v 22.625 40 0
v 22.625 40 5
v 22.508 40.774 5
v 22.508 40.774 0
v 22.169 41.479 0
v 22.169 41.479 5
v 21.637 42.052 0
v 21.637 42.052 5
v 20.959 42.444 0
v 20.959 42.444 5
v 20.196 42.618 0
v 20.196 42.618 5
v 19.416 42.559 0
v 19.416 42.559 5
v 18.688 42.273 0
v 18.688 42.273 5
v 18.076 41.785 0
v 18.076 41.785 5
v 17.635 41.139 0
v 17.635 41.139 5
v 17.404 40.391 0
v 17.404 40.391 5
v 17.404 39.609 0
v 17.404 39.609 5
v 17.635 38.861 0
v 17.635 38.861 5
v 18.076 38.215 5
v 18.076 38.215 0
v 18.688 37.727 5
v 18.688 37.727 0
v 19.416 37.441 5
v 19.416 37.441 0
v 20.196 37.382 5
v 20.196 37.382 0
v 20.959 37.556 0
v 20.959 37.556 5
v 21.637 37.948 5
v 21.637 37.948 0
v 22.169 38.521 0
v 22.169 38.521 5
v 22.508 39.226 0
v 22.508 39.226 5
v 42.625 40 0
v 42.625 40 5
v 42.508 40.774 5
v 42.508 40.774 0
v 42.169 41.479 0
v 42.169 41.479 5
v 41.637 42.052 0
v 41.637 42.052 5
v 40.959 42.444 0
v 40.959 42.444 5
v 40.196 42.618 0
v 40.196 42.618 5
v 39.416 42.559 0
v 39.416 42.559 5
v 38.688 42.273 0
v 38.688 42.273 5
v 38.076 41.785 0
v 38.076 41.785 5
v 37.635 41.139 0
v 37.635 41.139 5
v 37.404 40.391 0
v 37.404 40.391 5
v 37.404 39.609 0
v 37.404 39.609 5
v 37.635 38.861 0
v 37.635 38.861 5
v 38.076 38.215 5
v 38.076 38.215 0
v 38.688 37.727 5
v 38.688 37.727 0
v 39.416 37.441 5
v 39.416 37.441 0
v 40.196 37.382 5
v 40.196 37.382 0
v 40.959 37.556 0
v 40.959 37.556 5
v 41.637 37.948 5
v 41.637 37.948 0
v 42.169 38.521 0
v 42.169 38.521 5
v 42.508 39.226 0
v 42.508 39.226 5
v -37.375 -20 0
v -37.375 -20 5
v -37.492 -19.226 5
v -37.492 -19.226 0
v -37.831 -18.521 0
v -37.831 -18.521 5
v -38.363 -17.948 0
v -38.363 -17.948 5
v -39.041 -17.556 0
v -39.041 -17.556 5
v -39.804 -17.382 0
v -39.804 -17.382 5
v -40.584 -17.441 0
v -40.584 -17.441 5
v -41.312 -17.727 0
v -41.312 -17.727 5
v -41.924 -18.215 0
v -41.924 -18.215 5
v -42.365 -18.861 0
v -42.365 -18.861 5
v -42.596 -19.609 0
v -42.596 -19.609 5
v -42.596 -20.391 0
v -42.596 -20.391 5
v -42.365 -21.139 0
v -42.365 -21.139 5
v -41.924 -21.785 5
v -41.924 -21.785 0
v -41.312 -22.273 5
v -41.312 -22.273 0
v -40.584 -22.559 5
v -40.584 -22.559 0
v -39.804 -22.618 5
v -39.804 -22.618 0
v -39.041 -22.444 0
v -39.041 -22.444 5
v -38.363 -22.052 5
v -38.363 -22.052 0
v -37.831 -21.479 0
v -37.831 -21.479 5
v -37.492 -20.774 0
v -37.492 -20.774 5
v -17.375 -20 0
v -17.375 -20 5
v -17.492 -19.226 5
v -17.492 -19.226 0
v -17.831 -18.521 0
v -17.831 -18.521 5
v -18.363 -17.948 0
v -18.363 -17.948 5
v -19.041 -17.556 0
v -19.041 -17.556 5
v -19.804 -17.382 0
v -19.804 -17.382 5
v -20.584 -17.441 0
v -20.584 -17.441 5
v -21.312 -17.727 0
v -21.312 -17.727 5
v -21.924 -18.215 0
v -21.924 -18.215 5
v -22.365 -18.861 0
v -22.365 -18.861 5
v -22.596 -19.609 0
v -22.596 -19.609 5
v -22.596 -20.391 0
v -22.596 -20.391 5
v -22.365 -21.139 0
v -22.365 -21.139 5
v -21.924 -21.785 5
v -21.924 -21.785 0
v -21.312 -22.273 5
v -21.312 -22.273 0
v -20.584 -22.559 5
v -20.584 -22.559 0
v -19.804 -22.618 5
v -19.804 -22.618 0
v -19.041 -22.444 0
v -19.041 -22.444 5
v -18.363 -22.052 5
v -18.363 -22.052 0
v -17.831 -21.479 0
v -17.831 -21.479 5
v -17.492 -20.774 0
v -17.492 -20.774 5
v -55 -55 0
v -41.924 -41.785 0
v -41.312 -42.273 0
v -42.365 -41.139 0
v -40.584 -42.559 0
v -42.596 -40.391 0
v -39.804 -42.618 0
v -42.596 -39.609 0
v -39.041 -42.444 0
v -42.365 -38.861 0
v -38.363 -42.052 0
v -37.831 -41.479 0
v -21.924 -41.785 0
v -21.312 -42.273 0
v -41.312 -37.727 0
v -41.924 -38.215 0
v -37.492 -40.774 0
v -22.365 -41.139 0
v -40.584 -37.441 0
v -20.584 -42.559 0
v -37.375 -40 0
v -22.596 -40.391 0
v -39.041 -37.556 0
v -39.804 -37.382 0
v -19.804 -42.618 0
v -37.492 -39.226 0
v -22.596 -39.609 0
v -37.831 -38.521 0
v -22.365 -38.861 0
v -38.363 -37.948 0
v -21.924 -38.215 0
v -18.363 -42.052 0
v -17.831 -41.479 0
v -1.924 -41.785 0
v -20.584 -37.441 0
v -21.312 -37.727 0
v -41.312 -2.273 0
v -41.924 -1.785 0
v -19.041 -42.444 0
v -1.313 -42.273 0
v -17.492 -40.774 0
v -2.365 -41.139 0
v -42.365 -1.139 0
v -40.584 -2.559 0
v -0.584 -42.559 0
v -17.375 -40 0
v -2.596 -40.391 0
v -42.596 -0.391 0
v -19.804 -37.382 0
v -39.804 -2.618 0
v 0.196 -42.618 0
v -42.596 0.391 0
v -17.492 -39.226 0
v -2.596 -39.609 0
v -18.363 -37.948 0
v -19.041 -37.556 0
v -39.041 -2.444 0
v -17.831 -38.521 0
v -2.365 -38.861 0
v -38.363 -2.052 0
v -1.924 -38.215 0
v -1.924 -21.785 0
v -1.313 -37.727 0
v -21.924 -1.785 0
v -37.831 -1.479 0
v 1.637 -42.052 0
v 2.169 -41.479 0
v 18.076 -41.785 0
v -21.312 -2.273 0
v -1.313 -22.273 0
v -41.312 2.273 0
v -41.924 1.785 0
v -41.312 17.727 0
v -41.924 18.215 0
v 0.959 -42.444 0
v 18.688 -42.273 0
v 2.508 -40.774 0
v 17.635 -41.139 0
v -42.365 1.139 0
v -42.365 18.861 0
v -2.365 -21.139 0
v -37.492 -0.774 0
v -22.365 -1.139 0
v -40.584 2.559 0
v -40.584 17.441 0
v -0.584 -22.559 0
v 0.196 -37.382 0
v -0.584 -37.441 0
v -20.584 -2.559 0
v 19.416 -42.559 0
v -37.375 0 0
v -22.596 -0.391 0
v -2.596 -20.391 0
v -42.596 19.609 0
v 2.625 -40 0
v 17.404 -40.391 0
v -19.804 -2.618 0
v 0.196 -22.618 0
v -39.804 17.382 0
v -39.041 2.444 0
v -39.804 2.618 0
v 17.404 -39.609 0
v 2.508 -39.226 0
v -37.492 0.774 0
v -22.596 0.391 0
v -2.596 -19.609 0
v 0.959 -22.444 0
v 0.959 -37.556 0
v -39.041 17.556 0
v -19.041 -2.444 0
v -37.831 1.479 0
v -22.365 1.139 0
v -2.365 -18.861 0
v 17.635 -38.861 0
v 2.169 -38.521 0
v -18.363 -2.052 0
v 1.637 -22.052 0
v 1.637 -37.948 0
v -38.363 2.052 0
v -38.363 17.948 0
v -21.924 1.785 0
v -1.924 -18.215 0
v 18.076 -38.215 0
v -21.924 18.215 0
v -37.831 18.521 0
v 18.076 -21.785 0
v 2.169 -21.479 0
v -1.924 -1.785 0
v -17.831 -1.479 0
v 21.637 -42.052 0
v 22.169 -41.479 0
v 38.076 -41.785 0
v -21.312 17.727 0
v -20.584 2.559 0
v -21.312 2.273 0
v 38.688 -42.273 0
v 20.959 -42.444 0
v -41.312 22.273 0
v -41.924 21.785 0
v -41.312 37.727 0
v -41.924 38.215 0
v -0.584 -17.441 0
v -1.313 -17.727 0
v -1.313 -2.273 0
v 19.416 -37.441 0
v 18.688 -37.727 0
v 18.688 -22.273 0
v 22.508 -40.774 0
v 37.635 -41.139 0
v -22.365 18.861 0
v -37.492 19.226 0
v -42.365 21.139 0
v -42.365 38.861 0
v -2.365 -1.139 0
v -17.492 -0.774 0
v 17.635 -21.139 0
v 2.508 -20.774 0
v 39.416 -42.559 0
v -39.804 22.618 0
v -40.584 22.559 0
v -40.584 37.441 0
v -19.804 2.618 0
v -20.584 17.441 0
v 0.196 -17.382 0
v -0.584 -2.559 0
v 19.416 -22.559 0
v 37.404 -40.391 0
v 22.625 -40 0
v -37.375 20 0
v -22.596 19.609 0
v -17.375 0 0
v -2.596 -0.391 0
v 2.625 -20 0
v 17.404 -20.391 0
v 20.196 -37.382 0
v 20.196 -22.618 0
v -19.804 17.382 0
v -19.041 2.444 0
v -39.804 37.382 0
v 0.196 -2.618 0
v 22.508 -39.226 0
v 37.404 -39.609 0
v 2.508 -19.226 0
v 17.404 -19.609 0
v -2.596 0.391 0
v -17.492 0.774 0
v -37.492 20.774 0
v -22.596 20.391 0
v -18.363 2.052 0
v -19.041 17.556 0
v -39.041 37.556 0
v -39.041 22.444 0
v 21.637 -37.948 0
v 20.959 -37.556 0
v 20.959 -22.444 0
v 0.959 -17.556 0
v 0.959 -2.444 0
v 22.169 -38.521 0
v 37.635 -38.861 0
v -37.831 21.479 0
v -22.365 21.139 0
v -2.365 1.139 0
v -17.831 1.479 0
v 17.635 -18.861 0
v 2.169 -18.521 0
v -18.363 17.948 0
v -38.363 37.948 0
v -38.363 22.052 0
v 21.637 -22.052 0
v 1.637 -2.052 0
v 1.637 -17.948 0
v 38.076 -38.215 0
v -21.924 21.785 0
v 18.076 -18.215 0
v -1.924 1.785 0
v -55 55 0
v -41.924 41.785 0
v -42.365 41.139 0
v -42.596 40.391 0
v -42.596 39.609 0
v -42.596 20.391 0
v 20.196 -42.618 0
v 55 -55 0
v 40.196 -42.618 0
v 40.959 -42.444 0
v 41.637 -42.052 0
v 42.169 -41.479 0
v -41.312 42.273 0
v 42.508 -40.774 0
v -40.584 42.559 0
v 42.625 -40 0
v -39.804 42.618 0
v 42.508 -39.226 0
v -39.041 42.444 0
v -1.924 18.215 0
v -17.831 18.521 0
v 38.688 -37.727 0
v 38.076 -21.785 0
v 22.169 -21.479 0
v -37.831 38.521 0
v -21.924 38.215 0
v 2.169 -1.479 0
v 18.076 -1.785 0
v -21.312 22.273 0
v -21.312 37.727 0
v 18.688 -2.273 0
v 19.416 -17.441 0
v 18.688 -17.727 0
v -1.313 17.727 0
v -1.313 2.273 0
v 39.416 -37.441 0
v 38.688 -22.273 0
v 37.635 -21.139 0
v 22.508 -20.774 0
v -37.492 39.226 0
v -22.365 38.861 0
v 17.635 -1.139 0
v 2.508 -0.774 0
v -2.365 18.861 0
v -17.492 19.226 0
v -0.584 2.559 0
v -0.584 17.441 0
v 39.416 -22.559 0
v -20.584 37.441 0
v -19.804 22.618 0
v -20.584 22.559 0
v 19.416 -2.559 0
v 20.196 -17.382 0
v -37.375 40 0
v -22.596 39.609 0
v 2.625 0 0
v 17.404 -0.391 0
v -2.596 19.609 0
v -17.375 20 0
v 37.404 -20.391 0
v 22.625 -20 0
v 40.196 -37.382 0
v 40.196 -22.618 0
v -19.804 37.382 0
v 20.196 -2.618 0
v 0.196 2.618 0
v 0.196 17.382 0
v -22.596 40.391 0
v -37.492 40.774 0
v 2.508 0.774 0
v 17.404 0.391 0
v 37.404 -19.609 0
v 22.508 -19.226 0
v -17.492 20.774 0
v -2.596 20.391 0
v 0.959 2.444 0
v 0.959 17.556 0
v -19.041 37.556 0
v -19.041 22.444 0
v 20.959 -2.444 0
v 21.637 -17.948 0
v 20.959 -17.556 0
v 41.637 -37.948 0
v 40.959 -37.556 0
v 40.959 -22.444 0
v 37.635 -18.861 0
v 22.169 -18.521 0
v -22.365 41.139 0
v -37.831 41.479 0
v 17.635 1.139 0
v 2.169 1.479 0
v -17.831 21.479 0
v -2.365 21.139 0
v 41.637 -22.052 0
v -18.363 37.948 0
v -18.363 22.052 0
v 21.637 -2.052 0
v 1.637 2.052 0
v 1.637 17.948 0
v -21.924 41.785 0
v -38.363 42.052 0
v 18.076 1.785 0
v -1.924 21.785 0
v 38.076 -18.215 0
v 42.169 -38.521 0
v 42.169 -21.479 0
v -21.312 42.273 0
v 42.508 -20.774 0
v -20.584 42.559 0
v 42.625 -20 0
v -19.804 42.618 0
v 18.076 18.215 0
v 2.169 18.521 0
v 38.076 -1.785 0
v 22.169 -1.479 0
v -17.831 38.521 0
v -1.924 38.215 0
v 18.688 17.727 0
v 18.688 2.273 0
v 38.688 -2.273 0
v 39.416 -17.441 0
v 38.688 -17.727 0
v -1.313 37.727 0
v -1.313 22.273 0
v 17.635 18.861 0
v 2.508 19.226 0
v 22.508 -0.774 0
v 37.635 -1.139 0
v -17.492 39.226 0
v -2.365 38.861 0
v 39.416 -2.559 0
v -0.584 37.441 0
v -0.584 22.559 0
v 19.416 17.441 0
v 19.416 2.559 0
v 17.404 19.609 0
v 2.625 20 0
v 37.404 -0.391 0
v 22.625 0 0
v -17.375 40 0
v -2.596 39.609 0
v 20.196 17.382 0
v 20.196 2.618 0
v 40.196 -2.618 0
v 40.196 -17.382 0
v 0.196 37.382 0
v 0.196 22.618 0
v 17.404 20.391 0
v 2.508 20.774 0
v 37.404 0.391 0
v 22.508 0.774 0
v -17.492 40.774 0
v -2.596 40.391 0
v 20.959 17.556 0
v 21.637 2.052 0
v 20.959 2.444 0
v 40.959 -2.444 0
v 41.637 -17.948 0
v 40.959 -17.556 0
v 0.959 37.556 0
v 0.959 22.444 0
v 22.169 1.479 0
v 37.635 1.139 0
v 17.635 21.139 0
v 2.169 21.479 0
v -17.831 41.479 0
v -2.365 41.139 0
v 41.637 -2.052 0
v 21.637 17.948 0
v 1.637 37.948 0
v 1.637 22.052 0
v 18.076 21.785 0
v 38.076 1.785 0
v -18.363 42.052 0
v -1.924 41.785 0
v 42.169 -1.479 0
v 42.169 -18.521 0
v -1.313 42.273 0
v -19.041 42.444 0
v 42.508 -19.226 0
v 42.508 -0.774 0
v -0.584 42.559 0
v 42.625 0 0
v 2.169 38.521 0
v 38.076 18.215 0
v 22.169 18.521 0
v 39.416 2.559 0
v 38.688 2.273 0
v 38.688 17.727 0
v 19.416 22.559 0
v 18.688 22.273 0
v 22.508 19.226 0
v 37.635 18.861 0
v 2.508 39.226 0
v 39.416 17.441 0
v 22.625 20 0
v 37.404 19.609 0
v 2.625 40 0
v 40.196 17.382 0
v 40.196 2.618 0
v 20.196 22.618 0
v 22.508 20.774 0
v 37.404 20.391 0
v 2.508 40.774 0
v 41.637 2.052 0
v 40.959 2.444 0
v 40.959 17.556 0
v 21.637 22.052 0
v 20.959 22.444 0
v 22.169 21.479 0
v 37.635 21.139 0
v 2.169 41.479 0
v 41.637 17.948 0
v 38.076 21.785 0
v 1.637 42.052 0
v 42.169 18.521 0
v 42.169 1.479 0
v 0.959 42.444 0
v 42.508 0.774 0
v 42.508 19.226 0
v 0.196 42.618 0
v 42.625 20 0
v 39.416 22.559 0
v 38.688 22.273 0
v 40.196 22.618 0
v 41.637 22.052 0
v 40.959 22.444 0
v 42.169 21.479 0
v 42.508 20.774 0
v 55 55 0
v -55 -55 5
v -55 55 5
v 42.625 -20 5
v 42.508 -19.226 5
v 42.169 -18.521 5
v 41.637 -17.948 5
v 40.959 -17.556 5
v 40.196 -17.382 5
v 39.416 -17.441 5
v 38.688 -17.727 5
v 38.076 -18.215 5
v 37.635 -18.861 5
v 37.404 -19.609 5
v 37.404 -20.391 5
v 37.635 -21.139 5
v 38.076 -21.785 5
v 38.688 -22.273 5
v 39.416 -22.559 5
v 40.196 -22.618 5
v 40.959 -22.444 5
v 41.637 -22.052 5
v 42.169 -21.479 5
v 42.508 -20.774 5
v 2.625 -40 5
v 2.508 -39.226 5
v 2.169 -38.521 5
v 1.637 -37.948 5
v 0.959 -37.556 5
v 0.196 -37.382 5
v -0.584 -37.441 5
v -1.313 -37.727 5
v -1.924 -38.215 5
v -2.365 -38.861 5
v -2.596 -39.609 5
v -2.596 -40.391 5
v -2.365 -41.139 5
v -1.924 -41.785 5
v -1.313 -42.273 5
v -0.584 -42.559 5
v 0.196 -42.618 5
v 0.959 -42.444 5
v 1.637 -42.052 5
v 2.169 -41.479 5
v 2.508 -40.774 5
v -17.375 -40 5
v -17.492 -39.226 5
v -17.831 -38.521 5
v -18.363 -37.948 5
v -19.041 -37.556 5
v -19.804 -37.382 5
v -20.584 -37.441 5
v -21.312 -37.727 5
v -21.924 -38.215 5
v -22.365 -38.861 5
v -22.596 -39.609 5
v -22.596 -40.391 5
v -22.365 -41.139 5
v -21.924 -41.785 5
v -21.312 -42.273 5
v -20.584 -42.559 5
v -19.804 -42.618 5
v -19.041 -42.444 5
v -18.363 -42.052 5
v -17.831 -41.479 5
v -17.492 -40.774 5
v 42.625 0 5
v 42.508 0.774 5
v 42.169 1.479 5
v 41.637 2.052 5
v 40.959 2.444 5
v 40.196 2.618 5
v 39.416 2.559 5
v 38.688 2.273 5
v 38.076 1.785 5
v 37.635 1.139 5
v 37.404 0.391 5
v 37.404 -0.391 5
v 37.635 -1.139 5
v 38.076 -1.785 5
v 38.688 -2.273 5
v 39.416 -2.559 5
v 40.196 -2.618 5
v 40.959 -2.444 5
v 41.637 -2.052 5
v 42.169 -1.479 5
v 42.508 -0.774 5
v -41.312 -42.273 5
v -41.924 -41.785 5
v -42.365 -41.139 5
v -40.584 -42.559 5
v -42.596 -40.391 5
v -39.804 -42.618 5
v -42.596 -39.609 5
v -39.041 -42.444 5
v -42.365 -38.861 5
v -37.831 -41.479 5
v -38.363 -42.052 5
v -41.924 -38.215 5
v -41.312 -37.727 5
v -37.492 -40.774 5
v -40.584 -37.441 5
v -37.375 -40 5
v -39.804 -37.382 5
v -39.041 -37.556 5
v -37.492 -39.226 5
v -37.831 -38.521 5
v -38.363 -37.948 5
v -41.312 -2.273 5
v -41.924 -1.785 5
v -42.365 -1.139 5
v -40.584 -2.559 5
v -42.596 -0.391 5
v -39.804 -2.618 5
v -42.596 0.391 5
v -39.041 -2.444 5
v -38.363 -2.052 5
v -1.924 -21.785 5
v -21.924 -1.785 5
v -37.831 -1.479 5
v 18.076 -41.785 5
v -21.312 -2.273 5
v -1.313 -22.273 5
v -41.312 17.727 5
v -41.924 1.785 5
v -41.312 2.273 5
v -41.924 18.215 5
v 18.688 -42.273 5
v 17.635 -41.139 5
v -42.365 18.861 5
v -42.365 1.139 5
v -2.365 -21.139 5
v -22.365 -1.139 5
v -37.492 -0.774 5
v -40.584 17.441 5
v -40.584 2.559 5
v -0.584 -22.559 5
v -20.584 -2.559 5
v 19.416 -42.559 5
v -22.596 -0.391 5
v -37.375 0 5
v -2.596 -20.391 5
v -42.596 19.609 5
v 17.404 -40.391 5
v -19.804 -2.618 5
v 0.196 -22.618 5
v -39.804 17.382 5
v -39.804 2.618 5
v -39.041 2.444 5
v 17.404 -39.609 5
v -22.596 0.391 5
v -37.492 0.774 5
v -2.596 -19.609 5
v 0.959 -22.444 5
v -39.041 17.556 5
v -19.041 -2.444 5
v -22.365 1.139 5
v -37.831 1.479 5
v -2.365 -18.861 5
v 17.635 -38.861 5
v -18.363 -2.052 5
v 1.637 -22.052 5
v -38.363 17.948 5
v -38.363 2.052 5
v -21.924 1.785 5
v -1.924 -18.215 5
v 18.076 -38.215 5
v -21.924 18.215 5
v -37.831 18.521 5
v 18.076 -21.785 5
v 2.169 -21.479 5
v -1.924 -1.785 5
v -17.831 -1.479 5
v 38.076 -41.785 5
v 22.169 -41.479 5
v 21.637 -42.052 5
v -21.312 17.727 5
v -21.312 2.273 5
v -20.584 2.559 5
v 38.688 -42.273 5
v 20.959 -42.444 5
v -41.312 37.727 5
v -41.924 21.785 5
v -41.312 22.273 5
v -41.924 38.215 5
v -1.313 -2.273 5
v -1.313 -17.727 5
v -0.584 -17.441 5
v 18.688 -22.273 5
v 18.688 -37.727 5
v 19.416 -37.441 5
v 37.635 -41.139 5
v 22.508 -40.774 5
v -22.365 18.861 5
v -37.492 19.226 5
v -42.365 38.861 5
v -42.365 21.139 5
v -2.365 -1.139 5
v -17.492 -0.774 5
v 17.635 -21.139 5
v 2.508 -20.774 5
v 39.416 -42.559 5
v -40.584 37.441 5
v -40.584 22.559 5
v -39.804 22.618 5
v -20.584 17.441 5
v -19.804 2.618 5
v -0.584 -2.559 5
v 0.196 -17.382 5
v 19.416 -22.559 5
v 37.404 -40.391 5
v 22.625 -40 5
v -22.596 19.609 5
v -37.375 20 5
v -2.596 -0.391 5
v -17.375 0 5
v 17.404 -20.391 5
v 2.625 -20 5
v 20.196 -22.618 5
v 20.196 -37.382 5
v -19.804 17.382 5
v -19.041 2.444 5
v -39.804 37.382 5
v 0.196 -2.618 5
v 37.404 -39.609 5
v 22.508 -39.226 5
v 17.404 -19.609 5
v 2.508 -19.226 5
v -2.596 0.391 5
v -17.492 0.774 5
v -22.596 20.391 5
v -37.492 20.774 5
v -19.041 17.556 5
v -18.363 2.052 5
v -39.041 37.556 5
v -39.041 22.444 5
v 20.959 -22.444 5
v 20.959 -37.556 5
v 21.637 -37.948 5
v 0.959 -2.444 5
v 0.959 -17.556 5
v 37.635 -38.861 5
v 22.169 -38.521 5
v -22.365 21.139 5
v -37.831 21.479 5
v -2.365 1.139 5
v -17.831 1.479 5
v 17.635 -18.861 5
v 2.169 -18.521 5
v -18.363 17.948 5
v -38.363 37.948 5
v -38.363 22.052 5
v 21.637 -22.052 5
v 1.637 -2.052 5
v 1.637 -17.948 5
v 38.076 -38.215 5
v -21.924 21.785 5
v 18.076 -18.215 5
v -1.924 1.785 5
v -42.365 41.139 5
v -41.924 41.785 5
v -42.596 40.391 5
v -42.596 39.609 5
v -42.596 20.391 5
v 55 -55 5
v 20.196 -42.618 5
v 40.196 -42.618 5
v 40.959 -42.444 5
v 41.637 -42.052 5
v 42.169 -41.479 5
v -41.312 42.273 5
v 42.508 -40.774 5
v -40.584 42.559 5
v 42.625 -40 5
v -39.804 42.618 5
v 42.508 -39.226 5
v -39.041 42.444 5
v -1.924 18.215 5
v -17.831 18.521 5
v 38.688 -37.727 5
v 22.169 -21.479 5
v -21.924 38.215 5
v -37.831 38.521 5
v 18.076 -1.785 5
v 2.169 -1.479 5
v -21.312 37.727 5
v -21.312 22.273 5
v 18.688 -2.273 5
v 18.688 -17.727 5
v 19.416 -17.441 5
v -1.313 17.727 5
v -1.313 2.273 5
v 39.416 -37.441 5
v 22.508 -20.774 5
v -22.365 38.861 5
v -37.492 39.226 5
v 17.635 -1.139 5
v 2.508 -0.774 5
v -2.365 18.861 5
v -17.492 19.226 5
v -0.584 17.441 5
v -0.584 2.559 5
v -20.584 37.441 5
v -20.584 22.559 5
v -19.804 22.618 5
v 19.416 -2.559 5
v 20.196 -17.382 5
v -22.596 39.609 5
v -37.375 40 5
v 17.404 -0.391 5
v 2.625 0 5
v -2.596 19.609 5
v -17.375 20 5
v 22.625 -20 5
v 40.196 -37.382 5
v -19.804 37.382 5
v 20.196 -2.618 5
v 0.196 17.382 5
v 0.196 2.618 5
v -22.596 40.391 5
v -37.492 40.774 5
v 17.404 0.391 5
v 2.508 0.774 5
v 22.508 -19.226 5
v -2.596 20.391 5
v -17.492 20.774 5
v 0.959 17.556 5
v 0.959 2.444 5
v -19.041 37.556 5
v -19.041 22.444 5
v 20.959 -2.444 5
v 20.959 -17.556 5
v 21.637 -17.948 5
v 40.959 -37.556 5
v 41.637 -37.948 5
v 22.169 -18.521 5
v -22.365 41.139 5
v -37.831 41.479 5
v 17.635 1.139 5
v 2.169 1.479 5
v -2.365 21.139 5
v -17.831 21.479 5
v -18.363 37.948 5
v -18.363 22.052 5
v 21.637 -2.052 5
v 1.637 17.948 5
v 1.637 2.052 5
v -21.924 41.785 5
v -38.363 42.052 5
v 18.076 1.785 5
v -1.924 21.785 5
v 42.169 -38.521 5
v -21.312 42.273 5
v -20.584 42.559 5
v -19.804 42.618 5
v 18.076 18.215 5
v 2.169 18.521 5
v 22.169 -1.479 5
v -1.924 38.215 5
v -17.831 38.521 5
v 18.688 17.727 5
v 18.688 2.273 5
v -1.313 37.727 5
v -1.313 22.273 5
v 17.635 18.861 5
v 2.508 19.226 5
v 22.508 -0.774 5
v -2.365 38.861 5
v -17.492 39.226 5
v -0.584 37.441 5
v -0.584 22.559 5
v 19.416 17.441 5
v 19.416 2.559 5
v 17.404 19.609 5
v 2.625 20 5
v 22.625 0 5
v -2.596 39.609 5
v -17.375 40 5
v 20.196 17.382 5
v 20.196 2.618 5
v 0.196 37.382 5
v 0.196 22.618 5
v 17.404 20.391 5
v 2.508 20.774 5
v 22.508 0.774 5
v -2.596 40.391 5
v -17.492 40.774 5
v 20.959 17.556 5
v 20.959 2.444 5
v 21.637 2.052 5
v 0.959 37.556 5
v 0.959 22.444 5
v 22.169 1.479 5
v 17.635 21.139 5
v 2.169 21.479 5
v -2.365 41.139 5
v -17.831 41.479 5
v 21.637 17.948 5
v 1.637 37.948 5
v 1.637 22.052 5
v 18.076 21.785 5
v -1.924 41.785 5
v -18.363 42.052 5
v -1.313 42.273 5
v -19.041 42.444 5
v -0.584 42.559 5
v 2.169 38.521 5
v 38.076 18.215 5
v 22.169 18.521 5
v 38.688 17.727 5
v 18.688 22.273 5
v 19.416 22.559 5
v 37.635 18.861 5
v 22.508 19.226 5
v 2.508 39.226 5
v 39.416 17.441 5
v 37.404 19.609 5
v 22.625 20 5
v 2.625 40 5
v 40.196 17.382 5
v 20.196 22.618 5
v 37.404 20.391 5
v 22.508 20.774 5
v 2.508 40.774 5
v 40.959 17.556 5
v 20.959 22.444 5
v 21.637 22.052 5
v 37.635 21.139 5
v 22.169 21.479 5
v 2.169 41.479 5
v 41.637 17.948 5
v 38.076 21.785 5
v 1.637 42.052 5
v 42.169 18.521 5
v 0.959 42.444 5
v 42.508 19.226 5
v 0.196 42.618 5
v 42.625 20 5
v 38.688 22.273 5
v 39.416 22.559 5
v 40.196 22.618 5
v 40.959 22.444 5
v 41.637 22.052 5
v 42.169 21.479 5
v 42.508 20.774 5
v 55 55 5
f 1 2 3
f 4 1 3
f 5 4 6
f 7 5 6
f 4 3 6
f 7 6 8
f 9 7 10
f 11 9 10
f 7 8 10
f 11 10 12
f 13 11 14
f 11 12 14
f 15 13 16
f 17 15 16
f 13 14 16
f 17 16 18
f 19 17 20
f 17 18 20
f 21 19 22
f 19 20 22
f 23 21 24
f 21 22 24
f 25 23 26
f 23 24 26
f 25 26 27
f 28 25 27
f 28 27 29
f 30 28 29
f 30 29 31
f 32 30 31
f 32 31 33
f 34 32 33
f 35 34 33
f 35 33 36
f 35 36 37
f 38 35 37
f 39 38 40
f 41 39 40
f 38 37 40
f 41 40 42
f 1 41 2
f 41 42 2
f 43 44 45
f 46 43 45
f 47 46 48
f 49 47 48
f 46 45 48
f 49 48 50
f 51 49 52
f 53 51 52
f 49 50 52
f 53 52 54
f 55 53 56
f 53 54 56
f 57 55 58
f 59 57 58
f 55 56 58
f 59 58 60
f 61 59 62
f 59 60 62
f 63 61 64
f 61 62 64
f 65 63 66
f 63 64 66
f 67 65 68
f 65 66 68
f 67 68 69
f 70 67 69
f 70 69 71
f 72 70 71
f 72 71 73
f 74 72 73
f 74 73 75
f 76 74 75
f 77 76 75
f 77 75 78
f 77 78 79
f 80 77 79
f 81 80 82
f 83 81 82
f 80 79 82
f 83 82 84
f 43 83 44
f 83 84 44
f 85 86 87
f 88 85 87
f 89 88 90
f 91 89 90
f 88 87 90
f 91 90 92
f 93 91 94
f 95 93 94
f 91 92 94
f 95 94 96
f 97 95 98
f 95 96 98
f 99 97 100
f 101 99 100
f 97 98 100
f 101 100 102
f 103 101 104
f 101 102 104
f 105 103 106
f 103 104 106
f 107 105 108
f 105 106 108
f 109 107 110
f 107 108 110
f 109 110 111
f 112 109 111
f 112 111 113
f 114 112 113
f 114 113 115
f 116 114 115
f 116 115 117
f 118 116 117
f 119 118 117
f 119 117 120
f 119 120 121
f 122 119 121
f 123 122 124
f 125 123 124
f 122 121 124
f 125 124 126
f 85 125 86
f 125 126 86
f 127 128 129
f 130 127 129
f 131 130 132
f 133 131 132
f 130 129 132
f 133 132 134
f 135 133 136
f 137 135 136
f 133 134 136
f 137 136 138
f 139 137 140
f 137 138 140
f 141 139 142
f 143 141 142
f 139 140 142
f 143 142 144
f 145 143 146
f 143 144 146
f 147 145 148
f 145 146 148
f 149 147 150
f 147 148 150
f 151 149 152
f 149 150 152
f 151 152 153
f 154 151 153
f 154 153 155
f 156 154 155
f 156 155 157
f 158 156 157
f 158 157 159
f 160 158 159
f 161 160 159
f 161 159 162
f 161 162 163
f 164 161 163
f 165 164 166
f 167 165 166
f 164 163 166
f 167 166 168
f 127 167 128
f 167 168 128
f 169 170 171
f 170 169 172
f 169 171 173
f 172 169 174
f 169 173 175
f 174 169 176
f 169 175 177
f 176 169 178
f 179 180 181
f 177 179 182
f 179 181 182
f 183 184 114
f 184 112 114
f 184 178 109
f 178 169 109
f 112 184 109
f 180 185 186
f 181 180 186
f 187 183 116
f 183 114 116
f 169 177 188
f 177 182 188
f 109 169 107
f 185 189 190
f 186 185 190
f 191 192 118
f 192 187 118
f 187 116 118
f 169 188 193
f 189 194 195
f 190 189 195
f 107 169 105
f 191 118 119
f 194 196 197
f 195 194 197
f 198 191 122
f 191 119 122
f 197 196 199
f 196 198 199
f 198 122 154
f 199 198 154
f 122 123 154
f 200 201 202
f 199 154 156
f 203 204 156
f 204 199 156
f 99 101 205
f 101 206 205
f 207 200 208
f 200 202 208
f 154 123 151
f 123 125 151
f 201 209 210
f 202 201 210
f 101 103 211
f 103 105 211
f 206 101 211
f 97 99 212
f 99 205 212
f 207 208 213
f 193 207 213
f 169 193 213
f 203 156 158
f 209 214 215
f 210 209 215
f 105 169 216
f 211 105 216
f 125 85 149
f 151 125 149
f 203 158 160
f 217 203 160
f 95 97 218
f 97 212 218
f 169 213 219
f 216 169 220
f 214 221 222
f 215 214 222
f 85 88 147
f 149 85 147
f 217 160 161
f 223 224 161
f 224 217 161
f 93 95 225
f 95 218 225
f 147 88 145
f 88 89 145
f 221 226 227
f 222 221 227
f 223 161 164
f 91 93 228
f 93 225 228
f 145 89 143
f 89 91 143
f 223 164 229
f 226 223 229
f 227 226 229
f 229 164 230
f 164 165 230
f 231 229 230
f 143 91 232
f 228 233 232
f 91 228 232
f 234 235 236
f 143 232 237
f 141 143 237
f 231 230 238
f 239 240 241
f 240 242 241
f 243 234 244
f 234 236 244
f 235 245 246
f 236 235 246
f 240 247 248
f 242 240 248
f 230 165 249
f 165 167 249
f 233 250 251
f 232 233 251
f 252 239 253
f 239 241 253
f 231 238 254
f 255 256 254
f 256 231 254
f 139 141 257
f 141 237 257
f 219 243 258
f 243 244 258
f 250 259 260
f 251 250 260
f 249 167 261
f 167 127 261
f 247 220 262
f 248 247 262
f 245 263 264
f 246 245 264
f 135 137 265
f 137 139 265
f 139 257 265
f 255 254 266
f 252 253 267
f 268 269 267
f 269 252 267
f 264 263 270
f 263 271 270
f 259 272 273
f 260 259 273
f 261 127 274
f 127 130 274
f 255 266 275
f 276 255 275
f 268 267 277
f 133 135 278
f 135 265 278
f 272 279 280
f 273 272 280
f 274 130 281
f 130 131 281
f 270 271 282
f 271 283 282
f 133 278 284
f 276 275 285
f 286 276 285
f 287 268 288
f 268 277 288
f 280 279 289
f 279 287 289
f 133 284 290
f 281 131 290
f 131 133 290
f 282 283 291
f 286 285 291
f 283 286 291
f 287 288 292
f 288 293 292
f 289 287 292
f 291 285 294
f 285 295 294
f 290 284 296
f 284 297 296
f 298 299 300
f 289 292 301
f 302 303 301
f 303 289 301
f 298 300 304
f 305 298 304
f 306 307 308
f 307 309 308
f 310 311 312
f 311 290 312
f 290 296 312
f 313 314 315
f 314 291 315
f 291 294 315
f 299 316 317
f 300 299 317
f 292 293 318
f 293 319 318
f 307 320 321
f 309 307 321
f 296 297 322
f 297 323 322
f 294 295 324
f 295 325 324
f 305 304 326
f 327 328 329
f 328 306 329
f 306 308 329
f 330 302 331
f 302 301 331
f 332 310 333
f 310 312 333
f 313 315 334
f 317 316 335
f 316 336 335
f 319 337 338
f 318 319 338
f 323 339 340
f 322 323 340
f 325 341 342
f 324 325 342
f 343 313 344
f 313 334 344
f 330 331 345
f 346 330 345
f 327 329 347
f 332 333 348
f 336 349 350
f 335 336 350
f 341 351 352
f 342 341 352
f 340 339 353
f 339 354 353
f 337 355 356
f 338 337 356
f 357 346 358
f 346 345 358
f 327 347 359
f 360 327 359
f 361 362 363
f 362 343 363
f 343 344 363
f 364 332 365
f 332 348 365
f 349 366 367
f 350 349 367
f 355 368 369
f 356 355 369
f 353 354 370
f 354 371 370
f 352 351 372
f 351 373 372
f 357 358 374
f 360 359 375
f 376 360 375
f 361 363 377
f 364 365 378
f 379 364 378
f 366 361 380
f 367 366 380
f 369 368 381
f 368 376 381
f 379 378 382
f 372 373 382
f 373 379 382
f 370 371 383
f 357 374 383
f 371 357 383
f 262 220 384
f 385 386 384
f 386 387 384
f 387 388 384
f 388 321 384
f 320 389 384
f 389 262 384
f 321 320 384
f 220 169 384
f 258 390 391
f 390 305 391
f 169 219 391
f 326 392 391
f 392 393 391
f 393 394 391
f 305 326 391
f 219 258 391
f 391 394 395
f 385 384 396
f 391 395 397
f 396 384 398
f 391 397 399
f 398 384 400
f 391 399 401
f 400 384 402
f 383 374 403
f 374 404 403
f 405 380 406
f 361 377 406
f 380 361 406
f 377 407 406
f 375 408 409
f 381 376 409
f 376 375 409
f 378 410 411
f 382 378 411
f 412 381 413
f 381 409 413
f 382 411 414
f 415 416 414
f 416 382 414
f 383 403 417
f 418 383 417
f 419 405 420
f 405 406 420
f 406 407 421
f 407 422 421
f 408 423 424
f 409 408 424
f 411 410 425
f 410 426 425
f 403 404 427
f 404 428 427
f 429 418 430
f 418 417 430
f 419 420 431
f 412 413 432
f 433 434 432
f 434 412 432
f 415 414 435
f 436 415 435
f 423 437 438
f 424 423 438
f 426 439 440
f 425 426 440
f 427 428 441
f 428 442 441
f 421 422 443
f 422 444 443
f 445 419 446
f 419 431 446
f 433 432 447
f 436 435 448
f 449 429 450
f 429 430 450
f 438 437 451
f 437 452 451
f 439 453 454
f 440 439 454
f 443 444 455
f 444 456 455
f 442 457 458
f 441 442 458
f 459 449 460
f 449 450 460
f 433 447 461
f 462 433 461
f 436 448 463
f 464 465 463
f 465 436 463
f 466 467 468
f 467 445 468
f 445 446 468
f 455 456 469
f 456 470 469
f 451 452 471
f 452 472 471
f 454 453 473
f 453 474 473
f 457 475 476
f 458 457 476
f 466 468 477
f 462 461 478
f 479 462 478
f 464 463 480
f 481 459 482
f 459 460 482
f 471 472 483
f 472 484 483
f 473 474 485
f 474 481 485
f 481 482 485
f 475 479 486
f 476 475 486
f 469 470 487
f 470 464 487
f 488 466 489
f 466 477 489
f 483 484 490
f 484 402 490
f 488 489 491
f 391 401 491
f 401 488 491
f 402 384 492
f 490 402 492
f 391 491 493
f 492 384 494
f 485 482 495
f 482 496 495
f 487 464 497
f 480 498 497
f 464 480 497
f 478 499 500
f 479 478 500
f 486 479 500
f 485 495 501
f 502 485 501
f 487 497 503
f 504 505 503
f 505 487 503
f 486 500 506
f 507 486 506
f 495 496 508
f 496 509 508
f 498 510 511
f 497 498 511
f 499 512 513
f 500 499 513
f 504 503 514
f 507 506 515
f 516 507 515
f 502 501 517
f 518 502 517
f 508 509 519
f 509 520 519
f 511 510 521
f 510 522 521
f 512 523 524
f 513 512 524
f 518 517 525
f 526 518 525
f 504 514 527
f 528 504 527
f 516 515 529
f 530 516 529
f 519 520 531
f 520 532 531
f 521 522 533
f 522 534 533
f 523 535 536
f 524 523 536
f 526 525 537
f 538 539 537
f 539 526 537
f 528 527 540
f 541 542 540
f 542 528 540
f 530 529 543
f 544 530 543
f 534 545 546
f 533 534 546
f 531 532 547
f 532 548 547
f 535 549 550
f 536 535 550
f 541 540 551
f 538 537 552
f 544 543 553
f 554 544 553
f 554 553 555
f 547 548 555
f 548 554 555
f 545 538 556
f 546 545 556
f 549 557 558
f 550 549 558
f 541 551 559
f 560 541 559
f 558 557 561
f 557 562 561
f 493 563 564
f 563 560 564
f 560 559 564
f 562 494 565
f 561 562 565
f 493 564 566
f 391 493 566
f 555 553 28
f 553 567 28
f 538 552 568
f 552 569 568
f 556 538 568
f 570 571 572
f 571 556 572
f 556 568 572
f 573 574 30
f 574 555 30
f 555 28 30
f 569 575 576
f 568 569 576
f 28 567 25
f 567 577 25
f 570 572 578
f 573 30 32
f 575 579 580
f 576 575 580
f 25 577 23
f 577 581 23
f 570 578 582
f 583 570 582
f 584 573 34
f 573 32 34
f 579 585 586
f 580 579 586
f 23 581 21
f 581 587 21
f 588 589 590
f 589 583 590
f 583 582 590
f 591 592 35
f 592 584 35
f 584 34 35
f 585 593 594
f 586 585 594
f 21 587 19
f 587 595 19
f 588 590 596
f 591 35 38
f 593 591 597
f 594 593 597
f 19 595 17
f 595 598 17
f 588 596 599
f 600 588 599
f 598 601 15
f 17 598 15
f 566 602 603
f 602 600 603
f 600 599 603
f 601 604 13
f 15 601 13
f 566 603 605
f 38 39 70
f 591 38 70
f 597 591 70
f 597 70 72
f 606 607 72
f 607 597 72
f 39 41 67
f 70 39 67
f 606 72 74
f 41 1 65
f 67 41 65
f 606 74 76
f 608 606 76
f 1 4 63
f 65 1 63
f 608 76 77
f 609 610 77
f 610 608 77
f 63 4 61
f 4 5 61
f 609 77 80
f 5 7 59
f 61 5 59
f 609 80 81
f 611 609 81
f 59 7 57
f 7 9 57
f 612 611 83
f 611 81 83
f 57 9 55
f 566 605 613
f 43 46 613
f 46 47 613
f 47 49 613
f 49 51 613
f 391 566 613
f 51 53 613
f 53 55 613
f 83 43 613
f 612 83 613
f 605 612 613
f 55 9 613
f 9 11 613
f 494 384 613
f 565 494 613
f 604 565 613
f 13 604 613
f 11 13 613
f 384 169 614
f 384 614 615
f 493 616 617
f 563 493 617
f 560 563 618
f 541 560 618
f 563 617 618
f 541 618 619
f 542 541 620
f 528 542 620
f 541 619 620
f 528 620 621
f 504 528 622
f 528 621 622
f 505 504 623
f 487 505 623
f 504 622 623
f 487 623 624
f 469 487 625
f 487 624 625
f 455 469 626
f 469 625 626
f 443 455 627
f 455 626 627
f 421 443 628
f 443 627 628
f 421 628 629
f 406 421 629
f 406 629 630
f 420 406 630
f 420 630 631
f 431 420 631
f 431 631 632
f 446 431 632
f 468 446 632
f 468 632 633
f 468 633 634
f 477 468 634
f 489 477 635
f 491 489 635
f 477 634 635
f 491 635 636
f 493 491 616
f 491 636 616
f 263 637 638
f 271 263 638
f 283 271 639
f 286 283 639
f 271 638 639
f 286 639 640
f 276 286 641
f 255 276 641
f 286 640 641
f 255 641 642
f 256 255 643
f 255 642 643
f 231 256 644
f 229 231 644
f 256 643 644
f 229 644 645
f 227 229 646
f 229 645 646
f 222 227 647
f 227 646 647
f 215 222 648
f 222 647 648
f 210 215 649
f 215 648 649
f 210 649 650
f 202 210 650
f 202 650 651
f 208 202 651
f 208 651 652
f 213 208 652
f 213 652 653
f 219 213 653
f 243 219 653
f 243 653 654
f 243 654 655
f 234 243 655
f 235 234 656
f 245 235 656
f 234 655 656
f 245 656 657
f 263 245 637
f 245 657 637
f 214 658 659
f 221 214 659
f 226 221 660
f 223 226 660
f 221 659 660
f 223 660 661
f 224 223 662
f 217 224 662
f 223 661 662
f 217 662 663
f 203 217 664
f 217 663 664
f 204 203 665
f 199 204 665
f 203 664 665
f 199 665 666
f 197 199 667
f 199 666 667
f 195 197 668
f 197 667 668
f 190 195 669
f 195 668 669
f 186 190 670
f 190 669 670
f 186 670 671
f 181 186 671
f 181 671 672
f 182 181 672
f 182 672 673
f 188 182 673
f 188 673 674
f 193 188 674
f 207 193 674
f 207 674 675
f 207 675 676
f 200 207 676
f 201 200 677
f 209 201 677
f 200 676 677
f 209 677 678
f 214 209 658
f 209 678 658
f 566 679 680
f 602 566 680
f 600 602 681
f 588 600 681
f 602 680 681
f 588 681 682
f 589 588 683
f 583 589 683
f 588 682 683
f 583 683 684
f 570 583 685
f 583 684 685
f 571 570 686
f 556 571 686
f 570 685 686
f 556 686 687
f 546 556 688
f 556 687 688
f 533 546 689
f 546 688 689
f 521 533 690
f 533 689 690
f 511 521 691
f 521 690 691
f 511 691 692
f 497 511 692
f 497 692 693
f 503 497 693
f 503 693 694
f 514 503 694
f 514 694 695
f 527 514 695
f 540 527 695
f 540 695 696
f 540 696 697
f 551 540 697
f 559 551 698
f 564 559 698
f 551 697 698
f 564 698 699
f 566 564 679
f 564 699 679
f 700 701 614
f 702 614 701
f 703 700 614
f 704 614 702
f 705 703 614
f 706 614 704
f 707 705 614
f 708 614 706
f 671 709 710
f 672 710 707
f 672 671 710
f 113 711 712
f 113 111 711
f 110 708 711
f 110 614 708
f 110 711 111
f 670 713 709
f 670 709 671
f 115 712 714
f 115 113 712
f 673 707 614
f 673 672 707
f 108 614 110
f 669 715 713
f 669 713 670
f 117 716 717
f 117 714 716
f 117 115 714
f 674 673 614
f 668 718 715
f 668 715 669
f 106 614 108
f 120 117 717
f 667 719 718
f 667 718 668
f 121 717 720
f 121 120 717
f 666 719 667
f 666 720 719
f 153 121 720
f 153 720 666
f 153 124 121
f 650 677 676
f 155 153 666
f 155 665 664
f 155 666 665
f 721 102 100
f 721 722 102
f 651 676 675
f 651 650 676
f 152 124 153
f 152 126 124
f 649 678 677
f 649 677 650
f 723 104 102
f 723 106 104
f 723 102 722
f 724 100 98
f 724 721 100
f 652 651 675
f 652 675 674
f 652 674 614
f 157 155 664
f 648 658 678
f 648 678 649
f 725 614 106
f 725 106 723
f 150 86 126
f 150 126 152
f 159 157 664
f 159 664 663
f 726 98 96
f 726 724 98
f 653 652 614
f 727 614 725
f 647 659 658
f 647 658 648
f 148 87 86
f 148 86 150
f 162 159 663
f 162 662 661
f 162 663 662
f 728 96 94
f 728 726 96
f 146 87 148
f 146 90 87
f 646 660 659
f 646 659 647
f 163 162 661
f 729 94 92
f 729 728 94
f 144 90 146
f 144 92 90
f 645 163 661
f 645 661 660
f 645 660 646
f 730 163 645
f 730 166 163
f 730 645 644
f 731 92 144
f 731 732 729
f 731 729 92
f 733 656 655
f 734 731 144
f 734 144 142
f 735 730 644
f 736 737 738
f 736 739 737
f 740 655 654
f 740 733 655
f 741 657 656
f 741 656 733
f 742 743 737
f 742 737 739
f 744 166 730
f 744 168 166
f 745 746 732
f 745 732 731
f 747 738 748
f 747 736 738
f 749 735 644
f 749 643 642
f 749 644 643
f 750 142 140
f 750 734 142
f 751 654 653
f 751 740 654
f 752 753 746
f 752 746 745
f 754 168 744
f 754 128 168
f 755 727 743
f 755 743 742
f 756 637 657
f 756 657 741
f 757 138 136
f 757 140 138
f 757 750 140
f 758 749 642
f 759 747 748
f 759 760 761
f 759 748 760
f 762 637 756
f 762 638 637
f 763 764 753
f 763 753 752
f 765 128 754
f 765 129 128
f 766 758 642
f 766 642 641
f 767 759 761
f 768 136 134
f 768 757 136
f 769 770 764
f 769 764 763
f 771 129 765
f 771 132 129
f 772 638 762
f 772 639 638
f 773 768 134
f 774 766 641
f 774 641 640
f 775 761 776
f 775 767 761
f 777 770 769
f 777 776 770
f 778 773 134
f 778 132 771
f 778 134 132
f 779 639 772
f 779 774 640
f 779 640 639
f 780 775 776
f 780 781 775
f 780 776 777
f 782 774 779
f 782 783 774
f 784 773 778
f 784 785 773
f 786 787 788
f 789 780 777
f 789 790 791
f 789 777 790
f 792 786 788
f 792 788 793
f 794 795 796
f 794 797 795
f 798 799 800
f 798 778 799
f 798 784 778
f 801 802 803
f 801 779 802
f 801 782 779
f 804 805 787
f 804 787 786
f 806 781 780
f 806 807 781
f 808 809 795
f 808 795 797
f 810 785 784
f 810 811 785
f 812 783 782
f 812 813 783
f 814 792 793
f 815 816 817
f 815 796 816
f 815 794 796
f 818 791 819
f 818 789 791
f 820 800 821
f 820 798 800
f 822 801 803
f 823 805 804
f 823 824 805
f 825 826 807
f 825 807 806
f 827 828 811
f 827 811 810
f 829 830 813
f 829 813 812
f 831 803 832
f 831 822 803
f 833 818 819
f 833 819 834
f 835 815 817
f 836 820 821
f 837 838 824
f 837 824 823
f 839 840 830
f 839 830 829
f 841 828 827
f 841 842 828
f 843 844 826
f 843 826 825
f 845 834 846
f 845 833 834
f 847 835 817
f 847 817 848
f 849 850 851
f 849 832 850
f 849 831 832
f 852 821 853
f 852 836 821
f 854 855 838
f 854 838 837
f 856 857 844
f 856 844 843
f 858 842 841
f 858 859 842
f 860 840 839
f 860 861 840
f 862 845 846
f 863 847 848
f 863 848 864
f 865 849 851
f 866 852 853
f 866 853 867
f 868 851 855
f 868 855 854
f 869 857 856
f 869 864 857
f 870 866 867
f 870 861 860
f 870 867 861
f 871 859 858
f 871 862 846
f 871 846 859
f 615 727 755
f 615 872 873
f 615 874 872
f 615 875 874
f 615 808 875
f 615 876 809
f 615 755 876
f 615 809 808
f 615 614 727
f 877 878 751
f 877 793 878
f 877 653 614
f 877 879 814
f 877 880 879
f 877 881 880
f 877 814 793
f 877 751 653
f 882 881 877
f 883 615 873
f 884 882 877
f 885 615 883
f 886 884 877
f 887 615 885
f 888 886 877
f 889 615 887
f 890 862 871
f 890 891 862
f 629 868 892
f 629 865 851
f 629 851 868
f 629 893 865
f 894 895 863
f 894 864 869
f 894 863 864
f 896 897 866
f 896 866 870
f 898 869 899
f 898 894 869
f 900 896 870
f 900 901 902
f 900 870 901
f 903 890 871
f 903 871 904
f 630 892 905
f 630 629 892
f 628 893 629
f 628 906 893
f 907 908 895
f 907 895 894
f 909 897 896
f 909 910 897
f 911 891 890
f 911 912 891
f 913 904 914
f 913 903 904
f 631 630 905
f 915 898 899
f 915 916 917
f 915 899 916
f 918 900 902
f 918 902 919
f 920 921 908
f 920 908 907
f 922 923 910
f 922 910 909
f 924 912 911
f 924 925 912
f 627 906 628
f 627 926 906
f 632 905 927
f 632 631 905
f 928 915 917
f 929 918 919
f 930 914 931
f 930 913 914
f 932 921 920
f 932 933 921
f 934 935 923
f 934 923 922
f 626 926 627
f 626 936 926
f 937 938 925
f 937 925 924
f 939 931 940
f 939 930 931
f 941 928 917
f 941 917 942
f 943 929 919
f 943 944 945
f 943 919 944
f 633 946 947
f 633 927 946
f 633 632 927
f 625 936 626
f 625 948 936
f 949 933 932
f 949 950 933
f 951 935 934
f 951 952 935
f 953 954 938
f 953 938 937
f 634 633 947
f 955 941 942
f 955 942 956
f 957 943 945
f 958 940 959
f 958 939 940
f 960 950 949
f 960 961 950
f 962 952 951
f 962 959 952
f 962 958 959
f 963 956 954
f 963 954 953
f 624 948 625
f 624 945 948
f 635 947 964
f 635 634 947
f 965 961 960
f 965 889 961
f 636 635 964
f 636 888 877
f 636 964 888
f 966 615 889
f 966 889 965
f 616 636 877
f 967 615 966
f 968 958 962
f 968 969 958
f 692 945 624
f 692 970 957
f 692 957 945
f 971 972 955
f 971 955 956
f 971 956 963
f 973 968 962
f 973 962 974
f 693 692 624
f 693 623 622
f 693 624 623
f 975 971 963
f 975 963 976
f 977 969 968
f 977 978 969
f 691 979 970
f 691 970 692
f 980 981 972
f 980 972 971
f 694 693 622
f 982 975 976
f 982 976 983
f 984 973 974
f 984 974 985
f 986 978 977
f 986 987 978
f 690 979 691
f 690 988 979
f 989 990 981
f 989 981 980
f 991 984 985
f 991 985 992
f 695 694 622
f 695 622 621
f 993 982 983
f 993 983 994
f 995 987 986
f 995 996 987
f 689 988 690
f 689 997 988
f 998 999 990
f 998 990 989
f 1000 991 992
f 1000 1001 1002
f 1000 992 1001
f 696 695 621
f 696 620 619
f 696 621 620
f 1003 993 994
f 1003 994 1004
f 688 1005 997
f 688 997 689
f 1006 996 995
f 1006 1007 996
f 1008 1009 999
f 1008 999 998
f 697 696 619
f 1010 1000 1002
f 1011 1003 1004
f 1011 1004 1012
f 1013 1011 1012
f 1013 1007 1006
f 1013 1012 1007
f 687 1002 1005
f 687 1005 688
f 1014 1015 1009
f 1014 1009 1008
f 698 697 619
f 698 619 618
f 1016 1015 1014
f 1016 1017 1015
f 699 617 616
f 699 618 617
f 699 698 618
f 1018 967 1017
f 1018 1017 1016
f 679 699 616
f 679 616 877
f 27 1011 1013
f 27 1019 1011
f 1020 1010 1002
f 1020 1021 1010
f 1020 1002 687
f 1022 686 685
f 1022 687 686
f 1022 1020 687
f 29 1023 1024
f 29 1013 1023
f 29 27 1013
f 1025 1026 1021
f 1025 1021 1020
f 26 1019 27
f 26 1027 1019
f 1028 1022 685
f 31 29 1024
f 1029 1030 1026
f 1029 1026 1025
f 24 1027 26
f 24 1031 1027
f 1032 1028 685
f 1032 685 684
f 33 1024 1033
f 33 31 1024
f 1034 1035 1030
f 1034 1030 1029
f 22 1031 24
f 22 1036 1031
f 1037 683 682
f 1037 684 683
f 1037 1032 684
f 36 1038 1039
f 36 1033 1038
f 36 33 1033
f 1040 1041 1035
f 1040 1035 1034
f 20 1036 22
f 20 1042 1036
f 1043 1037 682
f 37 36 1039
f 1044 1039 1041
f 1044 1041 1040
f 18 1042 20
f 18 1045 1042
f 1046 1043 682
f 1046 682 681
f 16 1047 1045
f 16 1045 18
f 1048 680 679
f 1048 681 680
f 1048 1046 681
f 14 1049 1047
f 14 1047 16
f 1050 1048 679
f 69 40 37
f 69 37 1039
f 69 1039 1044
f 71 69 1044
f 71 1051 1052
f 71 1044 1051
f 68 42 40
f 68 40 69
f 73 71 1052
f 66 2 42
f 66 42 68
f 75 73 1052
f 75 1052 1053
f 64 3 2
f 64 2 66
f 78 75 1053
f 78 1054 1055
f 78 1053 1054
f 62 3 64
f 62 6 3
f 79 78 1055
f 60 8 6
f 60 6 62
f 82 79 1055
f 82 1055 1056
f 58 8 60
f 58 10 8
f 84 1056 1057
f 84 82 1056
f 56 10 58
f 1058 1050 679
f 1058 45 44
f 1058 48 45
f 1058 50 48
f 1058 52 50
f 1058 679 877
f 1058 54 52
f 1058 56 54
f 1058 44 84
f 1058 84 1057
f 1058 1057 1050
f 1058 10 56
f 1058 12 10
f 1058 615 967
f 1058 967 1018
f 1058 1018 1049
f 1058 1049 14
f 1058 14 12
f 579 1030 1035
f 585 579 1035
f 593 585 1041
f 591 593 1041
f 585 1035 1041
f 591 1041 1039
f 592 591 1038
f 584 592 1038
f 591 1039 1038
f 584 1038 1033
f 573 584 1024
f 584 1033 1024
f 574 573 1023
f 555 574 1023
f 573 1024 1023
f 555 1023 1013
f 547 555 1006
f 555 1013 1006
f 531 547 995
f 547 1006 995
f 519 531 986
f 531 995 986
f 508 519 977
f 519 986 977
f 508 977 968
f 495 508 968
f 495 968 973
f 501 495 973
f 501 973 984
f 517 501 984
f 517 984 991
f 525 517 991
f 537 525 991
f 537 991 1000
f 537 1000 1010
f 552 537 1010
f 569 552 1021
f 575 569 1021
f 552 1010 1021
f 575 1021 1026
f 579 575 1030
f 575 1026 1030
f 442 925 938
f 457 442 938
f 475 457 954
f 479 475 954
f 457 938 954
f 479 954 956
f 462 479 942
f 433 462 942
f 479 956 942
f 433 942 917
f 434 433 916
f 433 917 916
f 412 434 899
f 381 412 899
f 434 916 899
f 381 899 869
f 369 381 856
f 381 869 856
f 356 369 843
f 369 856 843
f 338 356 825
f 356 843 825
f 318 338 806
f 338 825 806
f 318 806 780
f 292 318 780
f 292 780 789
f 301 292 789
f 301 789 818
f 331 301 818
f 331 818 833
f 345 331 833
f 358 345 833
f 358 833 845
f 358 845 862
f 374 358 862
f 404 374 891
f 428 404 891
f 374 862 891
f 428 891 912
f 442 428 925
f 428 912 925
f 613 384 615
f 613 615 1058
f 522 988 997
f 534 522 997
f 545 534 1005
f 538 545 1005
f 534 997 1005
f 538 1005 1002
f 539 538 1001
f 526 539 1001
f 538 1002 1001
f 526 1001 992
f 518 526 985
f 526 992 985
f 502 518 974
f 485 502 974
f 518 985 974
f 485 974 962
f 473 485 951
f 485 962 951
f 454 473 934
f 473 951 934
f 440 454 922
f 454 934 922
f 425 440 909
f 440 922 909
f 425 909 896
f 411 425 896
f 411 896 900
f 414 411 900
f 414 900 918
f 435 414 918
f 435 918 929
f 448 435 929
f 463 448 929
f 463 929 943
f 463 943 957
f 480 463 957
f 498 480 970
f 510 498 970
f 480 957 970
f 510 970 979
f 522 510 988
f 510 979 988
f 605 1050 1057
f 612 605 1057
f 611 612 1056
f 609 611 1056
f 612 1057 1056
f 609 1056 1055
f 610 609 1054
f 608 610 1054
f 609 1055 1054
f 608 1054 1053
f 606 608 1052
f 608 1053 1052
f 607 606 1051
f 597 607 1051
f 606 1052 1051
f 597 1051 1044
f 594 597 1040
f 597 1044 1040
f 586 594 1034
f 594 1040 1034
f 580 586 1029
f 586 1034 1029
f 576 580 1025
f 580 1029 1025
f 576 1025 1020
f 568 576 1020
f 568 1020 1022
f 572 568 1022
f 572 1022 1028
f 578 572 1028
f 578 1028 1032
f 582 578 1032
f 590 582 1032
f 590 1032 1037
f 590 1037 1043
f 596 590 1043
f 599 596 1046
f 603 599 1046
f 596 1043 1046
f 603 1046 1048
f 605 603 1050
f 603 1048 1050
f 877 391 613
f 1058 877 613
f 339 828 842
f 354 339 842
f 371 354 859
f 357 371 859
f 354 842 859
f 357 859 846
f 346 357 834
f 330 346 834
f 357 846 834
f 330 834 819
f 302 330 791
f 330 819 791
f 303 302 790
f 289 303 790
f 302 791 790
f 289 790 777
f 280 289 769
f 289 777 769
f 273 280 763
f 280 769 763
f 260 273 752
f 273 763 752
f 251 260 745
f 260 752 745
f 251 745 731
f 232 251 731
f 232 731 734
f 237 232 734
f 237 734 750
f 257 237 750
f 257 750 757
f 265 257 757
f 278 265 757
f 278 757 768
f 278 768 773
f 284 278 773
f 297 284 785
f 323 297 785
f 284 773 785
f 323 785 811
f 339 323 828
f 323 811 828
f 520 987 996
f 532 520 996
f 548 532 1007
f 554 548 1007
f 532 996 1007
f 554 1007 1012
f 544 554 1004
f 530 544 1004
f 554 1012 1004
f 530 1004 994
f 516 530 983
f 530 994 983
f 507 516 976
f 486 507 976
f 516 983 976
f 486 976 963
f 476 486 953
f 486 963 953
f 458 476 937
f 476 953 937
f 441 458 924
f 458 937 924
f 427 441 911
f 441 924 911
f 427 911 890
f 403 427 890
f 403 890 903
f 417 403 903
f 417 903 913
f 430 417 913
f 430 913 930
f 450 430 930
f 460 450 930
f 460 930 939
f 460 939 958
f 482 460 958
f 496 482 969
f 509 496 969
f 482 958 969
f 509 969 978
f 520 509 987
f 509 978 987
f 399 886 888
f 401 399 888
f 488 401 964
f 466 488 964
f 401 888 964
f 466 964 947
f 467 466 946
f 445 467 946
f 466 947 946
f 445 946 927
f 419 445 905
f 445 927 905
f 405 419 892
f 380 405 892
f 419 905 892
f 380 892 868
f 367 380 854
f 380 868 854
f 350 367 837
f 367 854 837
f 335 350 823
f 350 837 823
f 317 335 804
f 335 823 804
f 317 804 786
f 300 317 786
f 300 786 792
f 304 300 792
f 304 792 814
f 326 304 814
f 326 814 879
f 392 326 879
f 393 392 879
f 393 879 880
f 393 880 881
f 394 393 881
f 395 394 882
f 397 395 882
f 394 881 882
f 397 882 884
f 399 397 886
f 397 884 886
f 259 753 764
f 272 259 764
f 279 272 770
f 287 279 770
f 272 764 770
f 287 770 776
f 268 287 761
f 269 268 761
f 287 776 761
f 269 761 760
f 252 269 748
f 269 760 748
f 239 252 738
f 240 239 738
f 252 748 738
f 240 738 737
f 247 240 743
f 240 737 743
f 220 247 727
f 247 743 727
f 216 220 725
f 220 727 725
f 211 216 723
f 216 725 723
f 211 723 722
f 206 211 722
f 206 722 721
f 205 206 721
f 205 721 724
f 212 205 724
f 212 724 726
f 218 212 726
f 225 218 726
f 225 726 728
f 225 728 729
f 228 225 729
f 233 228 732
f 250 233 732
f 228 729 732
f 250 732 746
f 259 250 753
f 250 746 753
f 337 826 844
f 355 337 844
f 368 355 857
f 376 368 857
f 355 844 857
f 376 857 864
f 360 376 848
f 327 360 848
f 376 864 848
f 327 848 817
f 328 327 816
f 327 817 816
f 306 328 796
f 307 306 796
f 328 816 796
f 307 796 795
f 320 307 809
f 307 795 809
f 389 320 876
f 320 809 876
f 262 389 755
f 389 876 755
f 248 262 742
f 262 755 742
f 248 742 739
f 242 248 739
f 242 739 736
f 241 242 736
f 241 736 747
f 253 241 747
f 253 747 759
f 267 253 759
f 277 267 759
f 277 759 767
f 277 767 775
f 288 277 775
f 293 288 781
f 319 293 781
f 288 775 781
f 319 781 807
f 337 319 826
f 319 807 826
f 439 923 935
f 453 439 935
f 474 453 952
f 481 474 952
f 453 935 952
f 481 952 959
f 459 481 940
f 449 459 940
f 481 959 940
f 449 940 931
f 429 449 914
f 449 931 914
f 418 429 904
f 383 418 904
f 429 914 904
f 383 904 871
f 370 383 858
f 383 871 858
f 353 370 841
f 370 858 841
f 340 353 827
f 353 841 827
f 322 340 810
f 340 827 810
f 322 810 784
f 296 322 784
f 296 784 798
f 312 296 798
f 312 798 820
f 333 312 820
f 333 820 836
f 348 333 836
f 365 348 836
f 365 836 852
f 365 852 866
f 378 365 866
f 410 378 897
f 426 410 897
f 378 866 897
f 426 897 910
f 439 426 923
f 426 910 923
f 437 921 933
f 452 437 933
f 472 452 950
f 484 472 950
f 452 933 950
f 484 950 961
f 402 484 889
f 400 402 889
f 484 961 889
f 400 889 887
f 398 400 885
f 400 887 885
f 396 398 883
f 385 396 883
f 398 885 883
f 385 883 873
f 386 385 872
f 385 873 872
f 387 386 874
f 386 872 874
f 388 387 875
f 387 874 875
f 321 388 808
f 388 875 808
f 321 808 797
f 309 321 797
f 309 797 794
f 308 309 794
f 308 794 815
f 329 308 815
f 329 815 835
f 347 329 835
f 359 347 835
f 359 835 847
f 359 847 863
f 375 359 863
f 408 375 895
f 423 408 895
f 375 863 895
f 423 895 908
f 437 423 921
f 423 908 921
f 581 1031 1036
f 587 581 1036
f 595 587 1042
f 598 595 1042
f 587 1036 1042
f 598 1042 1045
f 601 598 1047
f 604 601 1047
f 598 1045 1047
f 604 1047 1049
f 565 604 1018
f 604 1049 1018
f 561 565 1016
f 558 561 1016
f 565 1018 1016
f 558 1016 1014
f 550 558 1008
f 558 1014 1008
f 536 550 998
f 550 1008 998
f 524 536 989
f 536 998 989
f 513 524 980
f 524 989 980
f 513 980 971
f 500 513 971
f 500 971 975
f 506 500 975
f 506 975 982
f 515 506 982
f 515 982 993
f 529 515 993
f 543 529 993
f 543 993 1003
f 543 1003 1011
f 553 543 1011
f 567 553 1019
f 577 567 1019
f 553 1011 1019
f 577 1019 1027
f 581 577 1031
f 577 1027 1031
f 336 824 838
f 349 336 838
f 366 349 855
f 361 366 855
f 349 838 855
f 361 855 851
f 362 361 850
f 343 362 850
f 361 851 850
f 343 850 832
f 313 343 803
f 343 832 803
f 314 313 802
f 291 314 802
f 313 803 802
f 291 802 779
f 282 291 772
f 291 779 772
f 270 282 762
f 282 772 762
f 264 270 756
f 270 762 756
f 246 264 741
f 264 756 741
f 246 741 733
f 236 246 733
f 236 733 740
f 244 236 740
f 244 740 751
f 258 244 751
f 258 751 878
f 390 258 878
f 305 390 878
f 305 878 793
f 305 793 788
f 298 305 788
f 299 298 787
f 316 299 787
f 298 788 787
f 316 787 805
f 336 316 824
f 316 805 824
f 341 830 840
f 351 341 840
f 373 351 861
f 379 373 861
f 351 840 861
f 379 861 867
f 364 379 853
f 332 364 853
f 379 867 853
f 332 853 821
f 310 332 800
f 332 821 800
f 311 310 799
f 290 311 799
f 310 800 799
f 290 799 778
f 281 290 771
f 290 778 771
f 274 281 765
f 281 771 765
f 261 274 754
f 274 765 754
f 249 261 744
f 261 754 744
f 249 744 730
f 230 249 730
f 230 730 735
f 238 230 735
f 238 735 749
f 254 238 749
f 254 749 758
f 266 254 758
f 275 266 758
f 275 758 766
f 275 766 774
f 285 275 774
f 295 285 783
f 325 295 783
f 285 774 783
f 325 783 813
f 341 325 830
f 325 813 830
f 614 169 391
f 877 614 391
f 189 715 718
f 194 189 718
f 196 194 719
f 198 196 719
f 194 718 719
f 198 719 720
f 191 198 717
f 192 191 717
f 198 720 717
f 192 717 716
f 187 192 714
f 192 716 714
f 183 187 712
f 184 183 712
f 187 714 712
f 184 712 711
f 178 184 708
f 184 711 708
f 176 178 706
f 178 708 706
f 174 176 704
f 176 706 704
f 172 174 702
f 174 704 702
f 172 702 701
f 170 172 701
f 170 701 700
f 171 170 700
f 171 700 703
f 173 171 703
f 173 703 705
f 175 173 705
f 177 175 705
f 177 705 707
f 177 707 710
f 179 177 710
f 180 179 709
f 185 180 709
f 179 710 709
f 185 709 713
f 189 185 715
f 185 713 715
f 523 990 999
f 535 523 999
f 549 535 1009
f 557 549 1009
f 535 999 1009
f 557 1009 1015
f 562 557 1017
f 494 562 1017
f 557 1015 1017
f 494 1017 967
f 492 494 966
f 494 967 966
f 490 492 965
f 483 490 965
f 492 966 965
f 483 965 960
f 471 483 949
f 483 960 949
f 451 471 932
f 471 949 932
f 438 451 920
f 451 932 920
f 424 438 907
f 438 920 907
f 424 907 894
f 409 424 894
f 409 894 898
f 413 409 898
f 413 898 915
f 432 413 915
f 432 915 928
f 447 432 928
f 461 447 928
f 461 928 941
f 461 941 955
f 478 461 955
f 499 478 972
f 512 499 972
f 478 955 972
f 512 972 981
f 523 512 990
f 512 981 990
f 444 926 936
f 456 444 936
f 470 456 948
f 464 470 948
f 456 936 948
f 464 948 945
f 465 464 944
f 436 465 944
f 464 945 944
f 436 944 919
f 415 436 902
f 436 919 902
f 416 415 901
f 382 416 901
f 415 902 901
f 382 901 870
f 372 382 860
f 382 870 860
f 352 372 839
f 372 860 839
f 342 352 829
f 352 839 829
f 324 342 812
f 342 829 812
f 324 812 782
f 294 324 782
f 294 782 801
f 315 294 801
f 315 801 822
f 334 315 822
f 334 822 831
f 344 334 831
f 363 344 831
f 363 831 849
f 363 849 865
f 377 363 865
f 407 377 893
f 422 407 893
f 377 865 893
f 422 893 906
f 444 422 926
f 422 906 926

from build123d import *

# Parameters (mm, degrees)
SKETCH_W     = 110
SKETCH_H     = 110
PAD_DEPTH    = 5
SKETCH001_R  = 2.625
POCKET_DEPTH = 5


with BuildPart() as part:
    # Sketch → Pad (new body)
    with BuildSketch(Plane.XY):
        Rectangle(SKETCH_W, SKETCH_H)
    extrude(amount=PAD_DEPTH)

    # Sketch001 (on Face6 of Pad) → Pocket (cut)
    with BuildSketch(Plane.XY.offset(5)):
        Circle(SKETCH001_R)
        with Locations((20, 0)):
            Circle(SKETCH001_R)
        with Locations((40, 0)):
            Circle(SKETCH001_R)
        with Locations((-20, 0)):
            Circle(SKETCH001_R)
        with Locations((-40, 0)):
            Circle(SKETCH001_R)
        with Locations((-40, 20)):
            Circle(SKETCH001_R)
        with Locations((-40, 40)):
            Circle(SKETCH001_R)
        with Locations((-20, 20)):
            Circle(SKETCH001_R)
        with Locations((-20, 40)):
            Circle(SKETCH001_R)
        with Locations((0, 20)):
            Circle(SKETCH001_R)
        with Locations((0, 40)):
            Circle(SKETCH001_R)
        with Locations((20, 20)):
            Circle(SKETCH001_R)
        with Locations((20, 40)):
            Circle(SKETCH001_R)
        with Locations((40, 20)):
            Circle(SKETCH001_R)
        with Locations((40, 40)):
            Circle(SKETCH001_R)
        with Locations((0, -20)):
            Circle(SKETCH001_R)
        with Locations((0, -40)):
            Circle(SKETCH001_R)
        with Locations((20, -20)):
            Circle(SKETCH001_R)
        with Locations((20, -40)):
            Circle(SKETCH001_R)
        with Locations((40, -20)):
            Circle(SKETCH001_R)
        with Locations((40, -40)):
            Circle(SKETCH001_R)
        with Locations((-20, -40)):
            Circle(SKETCH001_R)
        with Locations((-20, -20)):
            Circle(SKETCH001_R)
        with Locations((-40, -20)):
            Circle(SKETCH001_R)
        with Locations((-40, -40)):
            Circle(SKETCH001_R)
    extrude(amount=-POCKET_DEPTH, mode=Mode.SUBTRACT)


solid = part.part
